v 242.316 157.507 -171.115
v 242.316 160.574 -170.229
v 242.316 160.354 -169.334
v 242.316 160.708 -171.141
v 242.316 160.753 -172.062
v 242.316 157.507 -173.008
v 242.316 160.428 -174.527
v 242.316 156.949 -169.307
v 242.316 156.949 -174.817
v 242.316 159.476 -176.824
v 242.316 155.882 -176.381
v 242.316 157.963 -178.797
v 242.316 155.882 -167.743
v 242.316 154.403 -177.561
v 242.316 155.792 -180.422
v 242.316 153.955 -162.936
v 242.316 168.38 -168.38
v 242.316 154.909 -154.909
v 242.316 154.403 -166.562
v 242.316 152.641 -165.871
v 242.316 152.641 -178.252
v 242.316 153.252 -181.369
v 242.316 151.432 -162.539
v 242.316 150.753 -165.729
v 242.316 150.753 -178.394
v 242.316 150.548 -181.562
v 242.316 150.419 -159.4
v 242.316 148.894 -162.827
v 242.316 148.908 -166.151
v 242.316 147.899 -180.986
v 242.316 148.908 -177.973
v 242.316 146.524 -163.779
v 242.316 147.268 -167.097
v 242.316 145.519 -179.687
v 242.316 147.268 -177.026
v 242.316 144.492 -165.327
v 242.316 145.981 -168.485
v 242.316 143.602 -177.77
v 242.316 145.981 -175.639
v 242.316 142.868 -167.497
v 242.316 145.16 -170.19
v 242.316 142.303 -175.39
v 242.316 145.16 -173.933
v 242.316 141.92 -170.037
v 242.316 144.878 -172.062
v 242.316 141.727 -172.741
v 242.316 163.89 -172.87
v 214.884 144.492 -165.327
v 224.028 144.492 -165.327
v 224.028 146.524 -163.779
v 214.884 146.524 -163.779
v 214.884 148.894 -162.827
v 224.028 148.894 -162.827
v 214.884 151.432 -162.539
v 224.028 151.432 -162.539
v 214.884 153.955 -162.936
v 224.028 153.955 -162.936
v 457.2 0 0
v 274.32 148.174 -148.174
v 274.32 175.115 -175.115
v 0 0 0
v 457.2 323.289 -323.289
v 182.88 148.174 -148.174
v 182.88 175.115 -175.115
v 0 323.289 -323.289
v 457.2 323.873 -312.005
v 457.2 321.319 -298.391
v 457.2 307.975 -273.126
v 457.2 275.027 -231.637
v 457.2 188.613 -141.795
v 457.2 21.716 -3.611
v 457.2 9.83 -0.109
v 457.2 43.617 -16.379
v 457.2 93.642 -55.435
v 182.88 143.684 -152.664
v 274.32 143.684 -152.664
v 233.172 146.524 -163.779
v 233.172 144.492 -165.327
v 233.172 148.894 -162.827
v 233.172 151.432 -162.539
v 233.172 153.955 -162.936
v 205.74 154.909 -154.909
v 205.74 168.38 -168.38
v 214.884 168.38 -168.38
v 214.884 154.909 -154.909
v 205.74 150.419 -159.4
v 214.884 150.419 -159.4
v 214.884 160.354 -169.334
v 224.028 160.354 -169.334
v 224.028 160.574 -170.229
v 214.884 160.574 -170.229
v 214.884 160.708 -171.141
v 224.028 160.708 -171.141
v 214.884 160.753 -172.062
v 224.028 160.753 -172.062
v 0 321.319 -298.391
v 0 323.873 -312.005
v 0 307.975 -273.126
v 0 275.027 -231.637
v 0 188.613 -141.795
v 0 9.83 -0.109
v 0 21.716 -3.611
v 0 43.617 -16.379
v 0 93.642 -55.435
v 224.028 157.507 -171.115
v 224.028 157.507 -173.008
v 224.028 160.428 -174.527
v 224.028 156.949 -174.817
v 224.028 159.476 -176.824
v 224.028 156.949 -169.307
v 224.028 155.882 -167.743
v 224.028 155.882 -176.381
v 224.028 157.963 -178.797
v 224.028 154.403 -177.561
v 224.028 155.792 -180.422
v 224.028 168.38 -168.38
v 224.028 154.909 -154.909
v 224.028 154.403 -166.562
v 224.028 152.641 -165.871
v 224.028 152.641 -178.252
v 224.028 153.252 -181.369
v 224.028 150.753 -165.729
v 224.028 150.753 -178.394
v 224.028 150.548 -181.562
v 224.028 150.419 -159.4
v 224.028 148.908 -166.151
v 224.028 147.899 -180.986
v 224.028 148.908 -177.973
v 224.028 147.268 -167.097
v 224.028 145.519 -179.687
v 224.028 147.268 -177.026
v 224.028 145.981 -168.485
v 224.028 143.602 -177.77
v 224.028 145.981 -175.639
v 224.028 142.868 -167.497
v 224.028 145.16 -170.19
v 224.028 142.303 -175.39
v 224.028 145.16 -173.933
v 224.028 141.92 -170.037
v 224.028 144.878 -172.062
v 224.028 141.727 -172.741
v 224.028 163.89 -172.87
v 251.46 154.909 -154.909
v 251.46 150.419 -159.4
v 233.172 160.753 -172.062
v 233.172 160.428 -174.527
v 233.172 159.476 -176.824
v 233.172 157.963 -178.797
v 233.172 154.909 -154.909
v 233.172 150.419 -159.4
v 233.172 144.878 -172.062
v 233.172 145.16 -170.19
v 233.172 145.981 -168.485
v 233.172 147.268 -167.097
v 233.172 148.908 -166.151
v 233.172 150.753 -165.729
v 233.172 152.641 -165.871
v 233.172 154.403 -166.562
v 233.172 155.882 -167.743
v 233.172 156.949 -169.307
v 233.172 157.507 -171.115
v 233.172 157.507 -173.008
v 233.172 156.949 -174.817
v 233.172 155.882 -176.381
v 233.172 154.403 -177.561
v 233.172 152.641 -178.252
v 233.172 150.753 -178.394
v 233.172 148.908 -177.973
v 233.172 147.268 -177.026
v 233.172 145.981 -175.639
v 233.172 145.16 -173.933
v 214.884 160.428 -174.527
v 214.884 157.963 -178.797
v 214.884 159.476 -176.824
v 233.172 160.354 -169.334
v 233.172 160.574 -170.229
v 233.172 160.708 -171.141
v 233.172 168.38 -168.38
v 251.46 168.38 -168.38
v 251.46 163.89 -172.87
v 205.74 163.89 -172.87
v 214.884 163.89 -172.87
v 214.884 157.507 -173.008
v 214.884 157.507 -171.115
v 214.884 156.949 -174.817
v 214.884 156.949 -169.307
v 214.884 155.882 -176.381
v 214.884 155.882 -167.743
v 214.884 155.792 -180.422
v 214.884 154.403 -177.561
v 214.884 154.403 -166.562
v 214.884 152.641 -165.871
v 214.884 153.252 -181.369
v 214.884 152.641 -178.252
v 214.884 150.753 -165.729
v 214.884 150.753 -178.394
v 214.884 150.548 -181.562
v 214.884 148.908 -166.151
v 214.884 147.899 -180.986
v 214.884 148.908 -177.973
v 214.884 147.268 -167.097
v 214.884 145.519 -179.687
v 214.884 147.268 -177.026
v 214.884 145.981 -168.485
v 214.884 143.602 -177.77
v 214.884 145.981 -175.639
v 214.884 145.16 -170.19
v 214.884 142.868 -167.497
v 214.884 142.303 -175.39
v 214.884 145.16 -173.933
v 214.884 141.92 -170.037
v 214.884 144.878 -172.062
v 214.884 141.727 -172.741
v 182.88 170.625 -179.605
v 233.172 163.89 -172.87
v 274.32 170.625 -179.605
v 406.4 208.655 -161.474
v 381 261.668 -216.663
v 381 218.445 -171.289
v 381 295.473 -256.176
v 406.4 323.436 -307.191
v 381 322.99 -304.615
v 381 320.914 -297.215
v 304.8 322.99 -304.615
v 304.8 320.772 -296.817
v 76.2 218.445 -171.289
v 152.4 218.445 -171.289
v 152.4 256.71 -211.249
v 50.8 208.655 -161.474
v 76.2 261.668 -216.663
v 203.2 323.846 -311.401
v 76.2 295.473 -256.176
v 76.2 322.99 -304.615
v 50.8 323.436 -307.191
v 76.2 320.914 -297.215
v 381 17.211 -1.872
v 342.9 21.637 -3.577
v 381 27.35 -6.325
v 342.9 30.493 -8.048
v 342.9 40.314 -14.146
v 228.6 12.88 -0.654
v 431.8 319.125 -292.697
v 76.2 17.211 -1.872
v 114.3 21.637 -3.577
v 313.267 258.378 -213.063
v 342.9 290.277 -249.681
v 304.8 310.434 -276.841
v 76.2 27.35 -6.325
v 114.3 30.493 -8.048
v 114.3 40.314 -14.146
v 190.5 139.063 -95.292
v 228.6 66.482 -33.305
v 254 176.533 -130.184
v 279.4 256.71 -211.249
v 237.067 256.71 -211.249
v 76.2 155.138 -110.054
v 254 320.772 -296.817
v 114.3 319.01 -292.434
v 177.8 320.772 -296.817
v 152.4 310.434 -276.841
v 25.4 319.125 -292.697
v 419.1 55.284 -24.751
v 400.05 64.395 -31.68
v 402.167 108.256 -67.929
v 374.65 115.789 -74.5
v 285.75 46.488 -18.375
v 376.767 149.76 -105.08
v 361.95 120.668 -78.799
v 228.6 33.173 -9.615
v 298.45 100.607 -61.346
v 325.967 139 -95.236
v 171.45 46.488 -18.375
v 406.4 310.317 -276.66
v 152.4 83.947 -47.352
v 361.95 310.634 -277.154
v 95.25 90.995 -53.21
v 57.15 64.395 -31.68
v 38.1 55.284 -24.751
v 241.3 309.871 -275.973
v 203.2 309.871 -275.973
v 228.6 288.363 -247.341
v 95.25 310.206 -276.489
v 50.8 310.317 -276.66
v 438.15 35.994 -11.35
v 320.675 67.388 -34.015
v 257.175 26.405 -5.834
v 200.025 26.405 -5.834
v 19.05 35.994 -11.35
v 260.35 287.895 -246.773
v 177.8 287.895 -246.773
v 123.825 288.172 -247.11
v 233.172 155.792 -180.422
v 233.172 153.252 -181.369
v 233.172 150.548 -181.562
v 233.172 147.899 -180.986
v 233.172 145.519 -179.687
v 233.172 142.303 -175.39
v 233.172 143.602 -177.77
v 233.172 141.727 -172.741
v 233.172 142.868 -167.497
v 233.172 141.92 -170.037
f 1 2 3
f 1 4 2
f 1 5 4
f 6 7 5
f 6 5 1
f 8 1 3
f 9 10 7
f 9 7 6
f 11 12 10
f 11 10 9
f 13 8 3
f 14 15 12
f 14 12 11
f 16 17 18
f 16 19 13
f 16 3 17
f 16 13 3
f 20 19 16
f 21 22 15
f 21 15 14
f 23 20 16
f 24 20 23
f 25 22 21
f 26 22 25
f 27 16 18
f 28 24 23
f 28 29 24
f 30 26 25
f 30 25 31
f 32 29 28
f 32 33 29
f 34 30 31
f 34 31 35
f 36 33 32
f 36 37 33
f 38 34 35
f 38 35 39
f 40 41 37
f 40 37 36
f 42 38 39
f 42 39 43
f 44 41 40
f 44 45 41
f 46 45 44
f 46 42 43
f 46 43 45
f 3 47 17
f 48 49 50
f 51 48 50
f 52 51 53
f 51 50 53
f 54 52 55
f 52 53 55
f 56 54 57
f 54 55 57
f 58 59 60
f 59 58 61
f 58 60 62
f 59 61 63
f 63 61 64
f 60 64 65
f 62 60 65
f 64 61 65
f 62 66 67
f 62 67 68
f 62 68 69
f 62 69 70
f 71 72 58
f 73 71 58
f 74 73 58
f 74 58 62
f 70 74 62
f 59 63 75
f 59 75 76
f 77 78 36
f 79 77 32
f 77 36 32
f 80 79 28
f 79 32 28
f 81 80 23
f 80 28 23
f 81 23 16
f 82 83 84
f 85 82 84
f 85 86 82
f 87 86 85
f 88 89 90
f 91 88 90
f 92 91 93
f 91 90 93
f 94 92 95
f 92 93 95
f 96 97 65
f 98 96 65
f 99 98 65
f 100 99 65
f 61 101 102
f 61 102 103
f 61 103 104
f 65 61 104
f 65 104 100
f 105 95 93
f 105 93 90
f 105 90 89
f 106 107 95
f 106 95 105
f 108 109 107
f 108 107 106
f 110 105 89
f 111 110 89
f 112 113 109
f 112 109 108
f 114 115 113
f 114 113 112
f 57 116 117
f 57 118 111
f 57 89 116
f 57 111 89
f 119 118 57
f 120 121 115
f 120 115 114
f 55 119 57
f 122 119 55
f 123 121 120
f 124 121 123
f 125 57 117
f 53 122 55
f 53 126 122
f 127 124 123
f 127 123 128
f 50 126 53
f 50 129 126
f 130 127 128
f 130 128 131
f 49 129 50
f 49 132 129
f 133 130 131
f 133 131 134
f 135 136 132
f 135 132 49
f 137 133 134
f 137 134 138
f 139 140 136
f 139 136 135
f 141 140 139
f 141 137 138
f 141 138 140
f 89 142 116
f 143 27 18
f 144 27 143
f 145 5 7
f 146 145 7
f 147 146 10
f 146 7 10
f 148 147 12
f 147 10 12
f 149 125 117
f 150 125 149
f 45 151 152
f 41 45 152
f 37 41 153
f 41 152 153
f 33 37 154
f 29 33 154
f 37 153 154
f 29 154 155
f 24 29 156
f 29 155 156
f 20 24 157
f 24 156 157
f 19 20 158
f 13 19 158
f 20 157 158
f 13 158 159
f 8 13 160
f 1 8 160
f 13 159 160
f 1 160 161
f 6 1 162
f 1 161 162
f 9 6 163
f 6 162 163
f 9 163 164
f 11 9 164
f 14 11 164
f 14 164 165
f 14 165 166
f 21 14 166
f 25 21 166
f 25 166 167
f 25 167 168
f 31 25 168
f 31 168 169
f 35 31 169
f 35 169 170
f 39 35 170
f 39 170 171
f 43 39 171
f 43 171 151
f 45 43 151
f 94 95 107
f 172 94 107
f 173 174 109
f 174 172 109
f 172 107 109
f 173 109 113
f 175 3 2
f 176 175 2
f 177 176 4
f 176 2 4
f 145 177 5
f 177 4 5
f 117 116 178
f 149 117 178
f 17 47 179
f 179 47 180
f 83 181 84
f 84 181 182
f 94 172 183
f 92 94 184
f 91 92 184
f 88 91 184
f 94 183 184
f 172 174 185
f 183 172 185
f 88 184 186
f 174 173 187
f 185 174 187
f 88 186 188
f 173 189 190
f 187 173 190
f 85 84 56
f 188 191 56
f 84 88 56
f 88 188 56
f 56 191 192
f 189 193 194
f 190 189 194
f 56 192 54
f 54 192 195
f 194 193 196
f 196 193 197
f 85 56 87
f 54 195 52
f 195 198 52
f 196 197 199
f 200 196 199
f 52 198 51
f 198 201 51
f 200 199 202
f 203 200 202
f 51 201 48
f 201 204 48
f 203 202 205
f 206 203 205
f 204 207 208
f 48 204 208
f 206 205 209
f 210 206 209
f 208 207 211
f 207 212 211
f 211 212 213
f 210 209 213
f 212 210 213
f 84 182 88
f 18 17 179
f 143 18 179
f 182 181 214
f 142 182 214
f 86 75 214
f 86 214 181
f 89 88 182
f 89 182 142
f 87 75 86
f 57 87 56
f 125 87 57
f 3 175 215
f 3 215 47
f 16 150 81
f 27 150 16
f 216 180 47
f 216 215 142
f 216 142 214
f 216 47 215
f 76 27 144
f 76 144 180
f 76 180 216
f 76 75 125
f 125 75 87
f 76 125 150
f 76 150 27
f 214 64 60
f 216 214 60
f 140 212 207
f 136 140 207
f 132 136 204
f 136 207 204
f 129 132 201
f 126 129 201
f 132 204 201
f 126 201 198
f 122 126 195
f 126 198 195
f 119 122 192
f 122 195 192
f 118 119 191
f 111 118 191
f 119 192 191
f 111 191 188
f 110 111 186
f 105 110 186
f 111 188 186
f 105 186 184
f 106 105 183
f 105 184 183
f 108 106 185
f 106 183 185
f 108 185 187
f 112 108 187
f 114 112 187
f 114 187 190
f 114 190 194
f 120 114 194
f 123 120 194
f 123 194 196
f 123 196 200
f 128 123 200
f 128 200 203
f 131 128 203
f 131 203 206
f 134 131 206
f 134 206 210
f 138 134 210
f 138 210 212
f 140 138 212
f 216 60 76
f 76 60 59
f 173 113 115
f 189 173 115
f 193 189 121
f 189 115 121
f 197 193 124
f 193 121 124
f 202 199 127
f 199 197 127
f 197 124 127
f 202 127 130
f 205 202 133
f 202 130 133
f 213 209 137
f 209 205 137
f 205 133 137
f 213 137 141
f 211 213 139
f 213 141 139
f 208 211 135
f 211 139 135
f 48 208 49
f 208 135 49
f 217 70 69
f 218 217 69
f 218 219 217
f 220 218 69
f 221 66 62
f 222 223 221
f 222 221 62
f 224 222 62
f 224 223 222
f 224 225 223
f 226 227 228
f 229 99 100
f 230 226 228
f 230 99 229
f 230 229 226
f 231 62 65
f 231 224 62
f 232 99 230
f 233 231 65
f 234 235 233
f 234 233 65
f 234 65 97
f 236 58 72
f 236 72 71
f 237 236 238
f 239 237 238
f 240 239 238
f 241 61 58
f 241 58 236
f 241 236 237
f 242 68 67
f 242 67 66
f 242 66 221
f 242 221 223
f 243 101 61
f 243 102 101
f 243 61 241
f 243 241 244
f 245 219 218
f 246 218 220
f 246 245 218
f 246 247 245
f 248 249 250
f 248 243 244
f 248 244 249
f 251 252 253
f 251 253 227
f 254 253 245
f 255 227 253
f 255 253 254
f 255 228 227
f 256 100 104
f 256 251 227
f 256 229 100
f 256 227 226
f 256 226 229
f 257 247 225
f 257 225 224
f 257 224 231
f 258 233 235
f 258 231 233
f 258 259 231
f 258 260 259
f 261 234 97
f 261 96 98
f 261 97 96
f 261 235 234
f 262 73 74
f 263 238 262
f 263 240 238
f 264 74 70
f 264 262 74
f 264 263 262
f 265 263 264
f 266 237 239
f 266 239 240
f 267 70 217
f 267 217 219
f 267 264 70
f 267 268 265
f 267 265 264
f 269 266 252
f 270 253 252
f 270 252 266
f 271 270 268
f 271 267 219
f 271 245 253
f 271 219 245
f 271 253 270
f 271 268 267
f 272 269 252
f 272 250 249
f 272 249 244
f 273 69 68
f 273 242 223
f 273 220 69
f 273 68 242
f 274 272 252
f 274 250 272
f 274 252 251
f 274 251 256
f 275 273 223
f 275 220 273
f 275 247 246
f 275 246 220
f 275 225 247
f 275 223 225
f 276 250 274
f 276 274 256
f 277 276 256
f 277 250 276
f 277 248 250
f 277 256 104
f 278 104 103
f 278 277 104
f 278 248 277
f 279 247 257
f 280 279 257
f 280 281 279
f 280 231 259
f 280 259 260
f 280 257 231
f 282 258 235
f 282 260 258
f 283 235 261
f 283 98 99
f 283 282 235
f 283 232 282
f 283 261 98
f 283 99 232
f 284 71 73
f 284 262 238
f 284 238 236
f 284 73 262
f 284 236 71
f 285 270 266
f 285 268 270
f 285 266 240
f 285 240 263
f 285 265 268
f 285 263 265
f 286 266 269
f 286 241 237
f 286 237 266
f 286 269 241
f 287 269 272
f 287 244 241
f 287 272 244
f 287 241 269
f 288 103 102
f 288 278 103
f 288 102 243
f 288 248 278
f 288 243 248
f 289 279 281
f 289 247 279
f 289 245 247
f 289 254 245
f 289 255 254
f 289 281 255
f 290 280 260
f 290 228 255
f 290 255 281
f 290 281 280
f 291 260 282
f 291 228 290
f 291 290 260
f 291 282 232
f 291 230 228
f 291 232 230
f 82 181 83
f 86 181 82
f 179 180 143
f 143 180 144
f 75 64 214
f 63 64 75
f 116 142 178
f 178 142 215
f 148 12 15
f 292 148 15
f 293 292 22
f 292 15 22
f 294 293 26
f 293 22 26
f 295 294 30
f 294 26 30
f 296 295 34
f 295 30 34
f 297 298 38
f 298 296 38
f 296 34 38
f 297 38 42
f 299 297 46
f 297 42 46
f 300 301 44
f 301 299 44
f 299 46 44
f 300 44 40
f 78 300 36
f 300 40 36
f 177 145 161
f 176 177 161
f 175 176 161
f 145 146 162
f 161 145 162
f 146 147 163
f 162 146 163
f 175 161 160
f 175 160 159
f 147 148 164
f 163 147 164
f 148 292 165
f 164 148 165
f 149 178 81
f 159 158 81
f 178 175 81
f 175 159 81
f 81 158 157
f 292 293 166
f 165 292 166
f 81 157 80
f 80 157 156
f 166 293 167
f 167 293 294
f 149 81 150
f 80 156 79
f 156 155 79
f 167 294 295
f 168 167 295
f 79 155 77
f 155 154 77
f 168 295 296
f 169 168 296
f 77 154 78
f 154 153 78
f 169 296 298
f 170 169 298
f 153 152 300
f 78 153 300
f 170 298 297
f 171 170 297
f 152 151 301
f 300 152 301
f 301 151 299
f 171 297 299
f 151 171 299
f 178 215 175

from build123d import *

# Parameters (mm, degrees)
F1_DEPTH  = 457.2
F2_W      = 91.44
F2_H      = 38.1
F3_DEPTH  = 6.35
F4_W      = 45.72
F4_H      = 19.05
F5_DEPTH  = 19.05
F6_W      = 9.144
F6_H      = 19.05
F7_DEPTH  = 25.4
F9_DEPTH  = 27.94
F10_R     = 6.35
F11_DEPTH = 50.8


with BuildPart() as f1:
    # F0 (on Right) → F1 (new body)
    with BuildSketch(Plane.YZ):
        with BuildLine():
            add(Edge.make_bspline(
                [(0, 0), (7.9206921486, 0.4964849945), (41.788781698, 2.6194053072), (328.8937583875, -268.1300359687), (324.4514783657, -311.8504178384), (323.2892203585, -323.2892203585)],
                knots=[0, 0, 0, 0, 0.1839351844, 0.786488501, 1, 1, 1, 1], degree=3))
            Line((0, 0), (323.2892203585, -323.2892203585))
        make_face()
    extrude(amount=F1_DEPTH)

    # F2 (on face) → F3 (join)
    with BuildSketch(Plane(origin=(0, 0, 0), x_dir=(1, 0, 0), z_dir=(0, -0.7071067812, -0.7071067812))):
        with Locations((228.6, -228.6)):
            Rectangle(F2_W, F2_H)
    extrude(amount=F3_DEPTH)

    # F4 (on face) → F5 (join)
    with BuildSketch(Plane(origin=(0, -4.4901280605, -4.4901280605), x_dir=(1, 0, 0), z_dir=(0, -0.7071067812, -0.7071067812))):
        with Locations((228.6, -228.6)):
            Rectangle(F4_W, F4_H)
    extrude(amount=F5_DEPTH)

    # F6 (on face) → F7 (cut)
    with BuildSketch(Plane(origin=(0, -17.9605122421, -17.9605122421), x_dir=(1, 0, 0), z_dir=(0, -0.7071067812, -0.7071067812))):
        with Locations((210.312, -228.6)):
            Rectangle(F6_W, F6_H)
        with Locations((228.6, -228.6)):
            Rectangle(F6_W, F6_H)
        with Locations((246.888, -228.6)):
            Rectangle(F6_W, F6_H)
    extrude(amount=-F7_DEPTH, mode=Mode.SUBTRACT)

    # F8 (on face) → F9 (cut)
    with BuildSketch(Plane.YZ.offset(242.316)):
        with BuildLine():
            ThreePointArc((144.492320988, -165.3265151889), (148.8943740988, -162.8268771513), (153.9554431224, -162.9356992435))
            Line((153.9554431224, -162.9356992435), (150.4192900279, -159.399546149))
            Line((150.4192900279, -159.399546149), (144.492320988, -165.3265151889))
        make_face()
        with BuildLine():
            ThreePointArc((160.353521115, -169.3337772361), (160.6522372537, -170.683230139), (160.7525130788, -172.0617072797))
            ThreePointArc((160.7525130788, -172.0617072797), (160.027465626, -175.706766973), (157.9627051696, -178.7968993705))
            Line((157.9627051696, -178.7968993705), (163.8896742095, -172.8699303306))
            Line((163.8896742095, -172.8699303306), (160.353521115, -169.3337772361))
        make_face()
        with BuildLine():
            Line((150.4192900279, -186.3403145122), (157.9627051696, -178.7968993705))
            ThreePointArc((157.9627051696, -178.7968993705), (144.492320988, -178.7968993705), (144.492320988, -165.3265151889))
            Line((144.492320988, -165.3265151889), (136.9489058463, -172.8699303306))
            Line((136.9489058463, -172.8699303306), (150.4192900279, -186.3403145122))
        make_face()
    extrude(amount=-F9_DEPTH, mode=Mode.SUBTRACT)

    # F10 (on face) → F11 (cut)
    with BuildSketch(Plane(origin=(214.884, 0, 0), x_dir=(0, -1, 0), z_dir=(-1, 0, 0))):
        with Locations((-151.2275130788, -172.0617072797)):
            Circle(F10_R)
    extrude(amount=-F11_DEPTH, mode=Mode.SUBTRACT)


solid = f1.part
